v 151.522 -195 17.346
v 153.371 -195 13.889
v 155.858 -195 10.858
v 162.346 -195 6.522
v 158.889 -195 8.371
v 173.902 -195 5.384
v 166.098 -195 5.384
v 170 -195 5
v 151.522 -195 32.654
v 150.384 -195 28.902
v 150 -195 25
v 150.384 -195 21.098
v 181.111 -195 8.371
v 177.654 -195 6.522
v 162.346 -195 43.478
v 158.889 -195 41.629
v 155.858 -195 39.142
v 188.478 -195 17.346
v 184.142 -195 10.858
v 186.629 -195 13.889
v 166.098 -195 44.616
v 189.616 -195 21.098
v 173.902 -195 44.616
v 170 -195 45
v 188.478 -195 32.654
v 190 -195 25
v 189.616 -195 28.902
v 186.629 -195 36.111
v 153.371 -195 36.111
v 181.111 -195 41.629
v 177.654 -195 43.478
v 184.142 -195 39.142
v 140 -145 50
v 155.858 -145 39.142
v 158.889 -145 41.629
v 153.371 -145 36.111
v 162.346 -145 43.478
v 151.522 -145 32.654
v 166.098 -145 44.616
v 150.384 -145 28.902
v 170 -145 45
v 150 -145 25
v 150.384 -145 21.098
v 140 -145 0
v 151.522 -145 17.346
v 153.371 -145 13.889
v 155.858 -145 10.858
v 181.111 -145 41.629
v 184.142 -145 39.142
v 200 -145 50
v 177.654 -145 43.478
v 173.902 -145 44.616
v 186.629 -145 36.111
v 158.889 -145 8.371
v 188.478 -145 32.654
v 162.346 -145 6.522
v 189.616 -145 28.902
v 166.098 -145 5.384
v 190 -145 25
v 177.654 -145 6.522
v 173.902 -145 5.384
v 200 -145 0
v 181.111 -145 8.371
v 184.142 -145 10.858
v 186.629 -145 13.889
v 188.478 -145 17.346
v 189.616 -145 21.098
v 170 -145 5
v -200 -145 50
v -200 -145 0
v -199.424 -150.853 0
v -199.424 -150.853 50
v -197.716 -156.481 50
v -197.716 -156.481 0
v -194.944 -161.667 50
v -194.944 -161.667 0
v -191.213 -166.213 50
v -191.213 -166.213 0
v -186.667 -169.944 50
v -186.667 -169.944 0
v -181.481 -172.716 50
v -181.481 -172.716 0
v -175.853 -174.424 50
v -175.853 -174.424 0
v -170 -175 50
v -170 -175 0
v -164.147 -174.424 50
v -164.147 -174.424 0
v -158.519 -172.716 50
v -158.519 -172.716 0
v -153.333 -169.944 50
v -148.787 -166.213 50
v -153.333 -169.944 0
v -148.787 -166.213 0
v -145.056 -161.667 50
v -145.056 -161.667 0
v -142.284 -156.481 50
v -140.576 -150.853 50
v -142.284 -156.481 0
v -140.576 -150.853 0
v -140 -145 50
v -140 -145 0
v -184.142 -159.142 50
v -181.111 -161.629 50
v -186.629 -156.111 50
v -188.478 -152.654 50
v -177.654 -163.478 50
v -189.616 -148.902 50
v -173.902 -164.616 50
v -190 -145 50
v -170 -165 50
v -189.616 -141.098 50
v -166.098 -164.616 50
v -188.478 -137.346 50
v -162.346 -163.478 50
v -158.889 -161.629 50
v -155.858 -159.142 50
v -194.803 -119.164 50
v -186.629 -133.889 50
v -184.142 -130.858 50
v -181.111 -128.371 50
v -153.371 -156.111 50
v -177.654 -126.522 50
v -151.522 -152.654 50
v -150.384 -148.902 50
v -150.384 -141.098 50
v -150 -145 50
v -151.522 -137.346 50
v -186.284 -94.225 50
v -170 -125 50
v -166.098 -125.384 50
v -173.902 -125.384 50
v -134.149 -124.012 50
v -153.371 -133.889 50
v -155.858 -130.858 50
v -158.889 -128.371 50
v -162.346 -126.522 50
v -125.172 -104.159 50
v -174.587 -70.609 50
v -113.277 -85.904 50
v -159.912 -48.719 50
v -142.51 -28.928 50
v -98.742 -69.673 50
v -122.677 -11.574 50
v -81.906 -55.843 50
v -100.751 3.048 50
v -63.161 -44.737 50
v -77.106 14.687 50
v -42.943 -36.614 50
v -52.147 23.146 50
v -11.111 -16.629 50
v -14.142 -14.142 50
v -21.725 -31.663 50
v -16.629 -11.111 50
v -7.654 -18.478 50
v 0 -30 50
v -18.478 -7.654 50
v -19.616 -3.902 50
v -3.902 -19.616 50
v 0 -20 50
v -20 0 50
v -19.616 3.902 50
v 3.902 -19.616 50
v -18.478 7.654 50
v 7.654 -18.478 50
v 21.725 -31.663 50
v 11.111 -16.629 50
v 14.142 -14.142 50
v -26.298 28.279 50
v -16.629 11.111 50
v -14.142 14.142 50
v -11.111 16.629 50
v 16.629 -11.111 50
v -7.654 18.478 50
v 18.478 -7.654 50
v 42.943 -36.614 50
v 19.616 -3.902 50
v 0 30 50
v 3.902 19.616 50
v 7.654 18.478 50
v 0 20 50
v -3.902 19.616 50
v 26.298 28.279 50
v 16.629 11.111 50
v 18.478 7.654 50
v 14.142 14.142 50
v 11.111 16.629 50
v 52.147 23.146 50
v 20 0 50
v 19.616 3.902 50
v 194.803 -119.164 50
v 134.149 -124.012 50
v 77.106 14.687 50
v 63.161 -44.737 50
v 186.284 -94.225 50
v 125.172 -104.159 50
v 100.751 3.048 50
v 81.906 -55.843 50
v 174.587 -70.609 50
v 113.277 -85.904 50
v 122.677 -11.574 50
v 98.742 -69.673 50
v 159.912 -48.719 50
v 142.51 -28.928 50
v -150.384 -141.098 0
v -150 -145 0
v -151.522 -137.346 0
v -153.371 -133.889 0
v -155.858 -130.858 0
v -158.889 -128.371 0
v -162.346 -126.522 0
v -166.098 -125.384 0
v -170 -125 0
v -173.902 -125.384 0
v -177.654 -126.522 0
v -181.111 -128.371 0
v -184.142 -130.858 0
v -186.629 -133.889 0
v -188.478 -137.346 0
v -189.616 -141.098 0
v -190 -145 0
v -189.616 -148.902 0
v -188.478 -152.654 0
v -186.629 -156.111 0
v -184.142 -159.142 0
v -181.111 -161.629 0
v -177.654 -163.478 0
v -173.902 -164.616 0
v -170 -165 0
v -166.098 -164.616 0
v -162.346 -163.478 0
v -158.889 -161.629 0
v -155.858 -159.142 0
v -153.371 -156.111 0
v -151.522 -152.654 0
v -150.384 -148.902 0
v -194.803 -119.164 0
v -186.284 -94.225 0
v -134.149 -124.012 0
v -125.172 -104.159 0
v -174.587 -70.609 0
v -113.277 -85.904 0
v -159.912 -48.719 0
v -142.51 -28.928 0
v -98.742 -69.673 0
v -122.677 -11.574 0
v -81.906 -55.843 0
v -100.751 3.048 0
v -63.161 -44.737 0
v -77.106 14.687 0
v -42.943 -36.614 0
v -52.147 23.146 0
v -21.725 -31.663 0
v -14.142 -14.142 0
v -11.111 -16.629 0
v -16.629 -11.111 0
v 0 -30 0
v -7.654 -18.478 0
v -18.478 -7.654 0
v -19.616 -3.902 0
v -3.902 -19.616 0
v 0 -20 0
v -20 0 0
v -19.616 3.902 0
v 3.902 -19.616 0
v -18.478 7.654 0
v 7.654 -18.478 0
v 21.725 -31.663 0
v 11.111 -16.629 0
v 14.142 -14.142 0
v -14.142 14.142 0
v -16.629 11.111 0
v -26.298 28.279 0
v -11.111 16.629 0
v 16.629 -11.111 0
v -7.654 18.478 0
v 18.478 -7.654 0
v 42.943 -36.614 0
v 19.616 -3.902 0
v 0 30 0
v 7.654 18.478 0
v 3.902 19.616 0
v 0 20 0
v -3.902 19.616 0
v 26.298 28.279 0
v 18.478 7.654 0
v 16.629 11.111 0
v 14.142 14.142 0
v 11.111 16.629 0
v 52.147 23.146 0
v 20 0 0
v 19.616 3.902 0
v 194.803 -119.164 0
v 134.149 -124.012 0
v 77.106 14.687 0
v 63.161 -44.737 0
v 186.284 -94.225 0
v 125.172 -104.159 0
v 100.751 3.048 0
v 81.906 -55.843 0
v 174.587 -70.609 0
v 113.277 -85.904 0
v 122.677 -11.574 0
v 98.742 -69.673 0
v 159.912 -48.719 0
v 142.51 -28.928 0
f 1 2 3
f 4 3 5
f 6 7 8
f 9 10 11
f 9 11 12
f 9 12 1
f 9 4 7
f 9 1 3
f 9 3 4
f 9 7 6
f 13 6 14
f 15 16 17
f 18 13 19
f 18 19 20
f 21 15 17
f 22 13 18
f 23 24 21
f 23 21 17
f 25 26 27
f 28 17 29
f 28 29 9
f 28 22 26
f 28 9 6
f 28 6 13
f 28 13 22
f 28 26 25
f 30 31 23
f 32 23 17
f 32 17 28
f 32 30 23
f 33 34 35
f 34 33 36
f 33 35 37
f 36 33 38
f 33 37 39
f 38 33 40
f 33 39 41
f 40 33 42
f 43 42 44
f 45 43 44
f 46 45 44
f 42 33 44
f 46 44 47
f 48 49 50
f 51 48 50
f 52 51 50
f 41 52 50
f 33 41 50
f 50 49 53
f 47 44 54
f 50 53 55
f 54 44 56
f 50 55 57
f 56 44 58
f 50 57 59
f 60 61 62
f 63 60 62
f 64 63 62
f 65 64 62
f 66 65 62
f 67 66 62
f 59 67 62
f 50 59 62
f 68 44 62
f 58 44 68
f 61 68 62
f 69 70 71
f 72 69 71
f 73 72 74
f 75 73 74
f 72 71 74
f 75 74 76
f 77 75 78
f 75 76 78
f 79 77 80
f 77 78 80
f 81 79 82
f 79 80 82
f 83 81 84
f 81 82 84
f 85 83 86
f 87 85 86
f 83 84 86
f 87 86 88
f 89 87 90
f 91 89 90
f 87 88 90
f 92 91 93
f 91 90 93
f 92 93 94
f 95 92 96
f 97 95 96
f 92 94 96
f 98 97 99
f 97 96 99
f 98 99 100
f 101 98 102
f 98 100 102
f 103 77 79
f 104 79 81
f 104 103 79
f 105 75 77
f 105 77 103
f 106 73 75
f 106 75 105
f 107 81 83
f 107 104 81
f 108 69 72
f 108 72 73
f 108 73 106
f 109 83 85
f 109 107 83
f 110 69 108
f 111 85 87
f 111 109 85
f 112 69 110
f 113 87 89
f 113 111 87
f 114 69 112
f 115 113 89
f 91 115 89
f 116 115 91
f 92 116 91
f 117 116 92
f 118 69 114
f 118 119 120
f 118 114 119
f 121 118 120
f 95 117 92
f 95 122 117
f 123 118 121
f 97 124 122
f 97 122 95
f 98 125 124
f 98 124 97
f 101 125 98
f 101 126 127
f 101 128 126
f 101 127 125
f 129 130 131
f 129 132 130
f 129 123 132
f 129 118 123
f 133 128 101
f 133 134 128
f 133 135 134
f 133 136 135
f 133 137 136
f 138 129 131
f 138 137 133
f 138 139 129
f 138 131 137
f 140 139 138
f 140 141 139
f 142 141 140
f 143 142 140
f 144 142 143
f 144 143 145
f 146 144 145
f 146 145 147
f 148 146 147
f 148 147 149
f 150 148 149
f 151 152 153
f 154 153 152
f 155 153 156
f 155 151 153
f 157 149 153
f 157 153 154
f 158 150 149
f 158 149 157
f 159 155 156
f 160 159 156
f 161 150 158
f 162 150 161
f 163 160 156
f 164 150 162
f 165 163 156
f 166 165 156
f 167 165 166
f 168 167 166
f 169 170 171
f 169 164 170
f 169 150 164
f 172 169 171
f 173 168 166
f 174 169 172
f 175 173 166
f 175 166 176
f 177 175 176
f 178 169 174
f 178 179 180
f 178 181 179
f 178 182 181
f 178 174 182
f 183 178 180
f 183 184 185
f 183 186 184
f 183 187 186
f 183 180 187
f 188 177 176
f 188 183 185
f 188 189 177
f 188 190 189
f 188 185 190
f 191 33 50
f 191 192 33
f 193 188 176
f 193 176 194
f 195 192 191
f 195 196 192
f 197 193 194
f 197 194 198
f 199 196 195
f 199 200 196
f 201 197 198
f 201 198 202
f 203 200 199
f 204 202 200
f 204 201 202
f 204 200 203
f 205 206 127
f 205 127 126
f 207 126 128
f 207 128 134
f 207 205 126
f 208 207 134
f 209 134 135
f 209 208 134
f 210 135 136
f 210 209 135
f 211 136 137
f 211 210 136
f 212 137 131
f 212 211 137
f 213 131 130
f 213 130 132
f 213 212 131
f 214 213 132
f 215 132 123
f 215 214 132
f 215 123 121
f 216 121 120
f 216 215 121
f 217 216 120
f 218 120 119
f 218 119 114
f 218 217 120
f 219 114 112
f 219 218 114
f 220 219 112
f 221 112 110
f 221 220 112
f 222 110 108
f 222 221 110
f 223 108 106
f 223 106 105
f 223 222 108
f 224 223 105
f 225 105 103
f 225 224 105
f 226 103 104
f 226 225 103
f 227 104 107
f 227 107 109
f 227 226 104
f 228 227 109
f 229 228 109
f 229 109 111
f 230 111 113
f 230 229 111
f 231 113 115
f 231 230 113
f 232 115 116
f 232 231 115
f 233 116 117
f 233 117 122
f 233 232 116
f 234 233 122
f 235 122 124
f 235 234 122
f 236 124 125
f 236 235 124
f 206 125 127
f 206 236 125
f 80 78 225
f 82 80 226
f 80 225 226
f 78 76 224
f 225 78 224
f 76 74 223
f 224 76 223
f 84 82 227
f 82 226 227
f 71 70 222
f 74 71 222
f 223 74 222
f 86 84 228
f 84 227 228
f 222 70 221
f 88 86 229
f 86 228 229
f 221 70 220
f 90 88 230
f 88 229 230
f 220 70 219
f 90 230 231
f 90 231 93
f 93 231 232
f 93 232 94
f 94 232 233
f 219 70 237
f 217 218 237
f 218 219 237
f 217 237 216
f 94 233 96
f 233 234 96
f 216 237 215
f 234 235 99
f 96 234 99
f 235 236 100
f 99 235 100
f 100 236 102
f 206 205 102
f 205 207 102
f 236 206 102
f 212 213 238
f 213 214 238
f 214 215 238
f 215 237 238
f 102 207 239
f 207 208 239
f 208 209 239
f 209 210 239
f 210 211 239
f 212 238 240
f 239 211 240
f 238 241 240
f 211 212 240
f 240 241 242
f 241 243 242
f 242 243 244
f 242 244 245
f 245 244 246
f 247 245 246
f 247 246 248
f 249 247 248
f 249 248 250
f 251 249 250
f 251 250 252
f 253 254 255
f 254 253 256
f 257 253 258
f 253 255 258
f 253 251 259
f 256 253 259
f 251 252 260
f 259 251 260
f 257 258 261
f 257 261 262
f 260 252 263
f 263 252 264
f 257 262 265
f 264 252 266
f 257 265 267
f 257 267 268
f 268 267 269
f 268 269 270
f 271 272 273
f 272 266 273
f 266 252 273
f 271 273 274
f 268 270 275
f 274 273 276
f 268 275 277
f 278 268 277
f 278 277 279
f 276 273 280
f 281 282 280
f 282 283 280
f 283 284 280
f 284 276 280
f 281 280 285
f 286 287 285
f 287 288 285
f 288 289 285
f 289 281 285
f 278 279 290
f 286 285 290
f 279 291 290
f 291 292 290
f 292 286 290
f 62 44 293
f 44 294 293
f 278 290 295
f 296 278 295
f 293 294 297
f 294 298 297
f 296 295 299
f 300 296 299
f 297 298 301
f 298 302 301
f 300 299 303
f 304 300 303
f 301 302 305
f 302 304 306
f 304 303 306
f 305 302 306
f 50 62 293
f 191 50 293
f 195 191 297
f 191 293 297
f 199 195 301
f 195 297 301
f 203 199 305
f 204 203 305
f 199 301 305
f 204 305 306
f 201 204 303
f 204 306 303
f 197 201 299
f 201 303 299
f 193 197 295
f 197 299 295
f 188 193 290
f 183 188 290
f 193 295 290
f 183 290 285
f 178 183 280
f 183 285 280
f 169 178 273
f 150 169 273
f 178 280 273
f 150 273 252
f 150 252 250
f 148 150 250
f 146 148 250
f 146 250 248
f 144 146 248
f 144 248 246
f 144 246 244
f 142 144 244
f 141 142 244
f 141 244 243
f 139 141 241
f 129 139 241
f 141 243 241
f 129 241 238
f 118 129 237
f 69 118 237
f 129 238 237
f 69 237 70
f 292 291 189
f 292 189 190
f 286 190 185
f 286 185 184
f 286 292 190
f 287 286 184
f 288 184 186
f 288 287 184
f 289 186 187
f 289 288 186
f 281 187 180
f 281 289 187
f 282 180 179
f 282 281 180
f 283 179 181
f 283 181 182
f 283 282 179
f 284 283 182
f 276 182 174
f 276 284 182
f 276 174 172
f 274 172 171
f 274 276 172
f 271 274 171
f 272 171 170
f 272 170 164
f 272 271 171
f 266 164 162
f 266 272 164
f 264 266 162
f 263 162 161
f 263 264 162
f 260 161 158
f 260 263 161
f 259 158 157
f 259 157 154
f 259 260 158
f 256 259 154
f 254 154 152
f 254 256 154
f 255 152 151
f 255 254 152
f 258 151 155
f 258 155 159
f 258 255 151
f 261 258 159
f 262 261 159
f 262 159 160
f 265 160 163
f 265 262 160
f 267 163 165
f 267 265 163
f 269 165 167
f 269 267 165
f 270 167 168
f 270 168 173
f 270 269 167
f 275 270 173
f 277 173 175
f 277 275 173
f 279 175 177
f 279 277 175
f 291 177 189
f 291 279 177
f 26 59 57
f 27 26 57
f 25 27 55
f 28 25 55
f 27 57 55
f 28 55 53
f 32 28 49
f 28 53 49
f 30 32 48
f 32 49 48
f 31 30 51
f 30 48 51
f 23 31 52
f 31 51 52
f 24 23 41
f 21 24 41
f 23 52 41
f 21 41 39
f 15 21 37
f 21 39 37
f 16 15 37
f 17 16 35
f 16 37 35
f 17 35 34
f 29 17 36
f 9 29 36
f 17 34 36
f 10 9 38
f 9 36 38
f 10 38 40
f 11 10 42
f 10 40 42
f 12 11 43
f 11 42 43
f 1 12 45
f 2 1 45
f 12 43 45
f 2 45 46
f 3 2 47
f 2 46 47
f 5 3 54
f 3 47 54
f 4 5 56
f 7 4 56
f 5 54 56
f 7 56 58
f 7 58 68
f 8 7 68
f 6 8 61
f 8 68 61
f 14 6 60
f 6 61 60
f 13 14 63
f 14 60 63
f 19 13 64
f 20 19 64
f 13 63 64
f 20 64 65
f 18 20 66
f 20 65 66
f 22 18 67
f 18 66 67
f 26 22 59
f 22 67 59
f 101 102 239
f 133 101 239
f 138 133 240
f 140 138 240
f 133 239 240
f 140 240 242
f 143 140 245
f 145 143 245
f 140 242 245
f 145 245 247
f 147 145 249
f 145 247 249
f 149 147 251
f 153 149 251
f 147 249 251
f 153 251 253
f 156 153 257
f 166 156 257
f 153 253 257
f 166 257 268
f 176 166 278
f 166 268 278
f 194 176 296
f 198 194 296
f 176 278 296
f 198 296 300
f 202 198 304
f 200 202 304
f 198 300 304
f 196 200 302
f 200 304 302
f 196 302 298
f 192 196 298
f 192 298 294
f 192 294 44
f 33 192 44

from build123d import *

# Parameters (mm, degrees)
CROQUIS1_R              = 20
SALIENTE_EXTRUIR1_DEPTH = 50
CROQUIS2_R              = 20
SALIENTE_EXTRUIR2_DEPTH = 50


with BuildPart() as part:
    # Croquis1 → Saliente-Extruir1 (new body)
    with BuildSketch(Plane.XY):
        with BuildLine():
            Line((140, -145), (200, -145))
            ThreePointArc((200, -145), (0, 30), (-200, -145))
            ThreePointArc((-200, -145), (-170, -175), (-140, -145))
            ThreePointArc((-140, -145), (0, -30), (140, -145))
        make_face()
        Circle(CROQUIS1_R, mode=Mode.SUBTRACT)
        with Locations((-170, -145)):
            Circle(CROQUIS1_R, mode=Mode.SUBTRACT)
    extrude(amount=SALIENTE_EXTRUIR1_DEPTH)

    # Croquis2 → Saliente-Extruir2 (add)
    with BuildSketch(Plane.XZ.offset(145)):
        with Locations((170, 25)):
            Circle(CROQUIS2_R)
    extrude(amount=SALIENTE_EXTRUIR2_DEPTH)


solid = part.part
